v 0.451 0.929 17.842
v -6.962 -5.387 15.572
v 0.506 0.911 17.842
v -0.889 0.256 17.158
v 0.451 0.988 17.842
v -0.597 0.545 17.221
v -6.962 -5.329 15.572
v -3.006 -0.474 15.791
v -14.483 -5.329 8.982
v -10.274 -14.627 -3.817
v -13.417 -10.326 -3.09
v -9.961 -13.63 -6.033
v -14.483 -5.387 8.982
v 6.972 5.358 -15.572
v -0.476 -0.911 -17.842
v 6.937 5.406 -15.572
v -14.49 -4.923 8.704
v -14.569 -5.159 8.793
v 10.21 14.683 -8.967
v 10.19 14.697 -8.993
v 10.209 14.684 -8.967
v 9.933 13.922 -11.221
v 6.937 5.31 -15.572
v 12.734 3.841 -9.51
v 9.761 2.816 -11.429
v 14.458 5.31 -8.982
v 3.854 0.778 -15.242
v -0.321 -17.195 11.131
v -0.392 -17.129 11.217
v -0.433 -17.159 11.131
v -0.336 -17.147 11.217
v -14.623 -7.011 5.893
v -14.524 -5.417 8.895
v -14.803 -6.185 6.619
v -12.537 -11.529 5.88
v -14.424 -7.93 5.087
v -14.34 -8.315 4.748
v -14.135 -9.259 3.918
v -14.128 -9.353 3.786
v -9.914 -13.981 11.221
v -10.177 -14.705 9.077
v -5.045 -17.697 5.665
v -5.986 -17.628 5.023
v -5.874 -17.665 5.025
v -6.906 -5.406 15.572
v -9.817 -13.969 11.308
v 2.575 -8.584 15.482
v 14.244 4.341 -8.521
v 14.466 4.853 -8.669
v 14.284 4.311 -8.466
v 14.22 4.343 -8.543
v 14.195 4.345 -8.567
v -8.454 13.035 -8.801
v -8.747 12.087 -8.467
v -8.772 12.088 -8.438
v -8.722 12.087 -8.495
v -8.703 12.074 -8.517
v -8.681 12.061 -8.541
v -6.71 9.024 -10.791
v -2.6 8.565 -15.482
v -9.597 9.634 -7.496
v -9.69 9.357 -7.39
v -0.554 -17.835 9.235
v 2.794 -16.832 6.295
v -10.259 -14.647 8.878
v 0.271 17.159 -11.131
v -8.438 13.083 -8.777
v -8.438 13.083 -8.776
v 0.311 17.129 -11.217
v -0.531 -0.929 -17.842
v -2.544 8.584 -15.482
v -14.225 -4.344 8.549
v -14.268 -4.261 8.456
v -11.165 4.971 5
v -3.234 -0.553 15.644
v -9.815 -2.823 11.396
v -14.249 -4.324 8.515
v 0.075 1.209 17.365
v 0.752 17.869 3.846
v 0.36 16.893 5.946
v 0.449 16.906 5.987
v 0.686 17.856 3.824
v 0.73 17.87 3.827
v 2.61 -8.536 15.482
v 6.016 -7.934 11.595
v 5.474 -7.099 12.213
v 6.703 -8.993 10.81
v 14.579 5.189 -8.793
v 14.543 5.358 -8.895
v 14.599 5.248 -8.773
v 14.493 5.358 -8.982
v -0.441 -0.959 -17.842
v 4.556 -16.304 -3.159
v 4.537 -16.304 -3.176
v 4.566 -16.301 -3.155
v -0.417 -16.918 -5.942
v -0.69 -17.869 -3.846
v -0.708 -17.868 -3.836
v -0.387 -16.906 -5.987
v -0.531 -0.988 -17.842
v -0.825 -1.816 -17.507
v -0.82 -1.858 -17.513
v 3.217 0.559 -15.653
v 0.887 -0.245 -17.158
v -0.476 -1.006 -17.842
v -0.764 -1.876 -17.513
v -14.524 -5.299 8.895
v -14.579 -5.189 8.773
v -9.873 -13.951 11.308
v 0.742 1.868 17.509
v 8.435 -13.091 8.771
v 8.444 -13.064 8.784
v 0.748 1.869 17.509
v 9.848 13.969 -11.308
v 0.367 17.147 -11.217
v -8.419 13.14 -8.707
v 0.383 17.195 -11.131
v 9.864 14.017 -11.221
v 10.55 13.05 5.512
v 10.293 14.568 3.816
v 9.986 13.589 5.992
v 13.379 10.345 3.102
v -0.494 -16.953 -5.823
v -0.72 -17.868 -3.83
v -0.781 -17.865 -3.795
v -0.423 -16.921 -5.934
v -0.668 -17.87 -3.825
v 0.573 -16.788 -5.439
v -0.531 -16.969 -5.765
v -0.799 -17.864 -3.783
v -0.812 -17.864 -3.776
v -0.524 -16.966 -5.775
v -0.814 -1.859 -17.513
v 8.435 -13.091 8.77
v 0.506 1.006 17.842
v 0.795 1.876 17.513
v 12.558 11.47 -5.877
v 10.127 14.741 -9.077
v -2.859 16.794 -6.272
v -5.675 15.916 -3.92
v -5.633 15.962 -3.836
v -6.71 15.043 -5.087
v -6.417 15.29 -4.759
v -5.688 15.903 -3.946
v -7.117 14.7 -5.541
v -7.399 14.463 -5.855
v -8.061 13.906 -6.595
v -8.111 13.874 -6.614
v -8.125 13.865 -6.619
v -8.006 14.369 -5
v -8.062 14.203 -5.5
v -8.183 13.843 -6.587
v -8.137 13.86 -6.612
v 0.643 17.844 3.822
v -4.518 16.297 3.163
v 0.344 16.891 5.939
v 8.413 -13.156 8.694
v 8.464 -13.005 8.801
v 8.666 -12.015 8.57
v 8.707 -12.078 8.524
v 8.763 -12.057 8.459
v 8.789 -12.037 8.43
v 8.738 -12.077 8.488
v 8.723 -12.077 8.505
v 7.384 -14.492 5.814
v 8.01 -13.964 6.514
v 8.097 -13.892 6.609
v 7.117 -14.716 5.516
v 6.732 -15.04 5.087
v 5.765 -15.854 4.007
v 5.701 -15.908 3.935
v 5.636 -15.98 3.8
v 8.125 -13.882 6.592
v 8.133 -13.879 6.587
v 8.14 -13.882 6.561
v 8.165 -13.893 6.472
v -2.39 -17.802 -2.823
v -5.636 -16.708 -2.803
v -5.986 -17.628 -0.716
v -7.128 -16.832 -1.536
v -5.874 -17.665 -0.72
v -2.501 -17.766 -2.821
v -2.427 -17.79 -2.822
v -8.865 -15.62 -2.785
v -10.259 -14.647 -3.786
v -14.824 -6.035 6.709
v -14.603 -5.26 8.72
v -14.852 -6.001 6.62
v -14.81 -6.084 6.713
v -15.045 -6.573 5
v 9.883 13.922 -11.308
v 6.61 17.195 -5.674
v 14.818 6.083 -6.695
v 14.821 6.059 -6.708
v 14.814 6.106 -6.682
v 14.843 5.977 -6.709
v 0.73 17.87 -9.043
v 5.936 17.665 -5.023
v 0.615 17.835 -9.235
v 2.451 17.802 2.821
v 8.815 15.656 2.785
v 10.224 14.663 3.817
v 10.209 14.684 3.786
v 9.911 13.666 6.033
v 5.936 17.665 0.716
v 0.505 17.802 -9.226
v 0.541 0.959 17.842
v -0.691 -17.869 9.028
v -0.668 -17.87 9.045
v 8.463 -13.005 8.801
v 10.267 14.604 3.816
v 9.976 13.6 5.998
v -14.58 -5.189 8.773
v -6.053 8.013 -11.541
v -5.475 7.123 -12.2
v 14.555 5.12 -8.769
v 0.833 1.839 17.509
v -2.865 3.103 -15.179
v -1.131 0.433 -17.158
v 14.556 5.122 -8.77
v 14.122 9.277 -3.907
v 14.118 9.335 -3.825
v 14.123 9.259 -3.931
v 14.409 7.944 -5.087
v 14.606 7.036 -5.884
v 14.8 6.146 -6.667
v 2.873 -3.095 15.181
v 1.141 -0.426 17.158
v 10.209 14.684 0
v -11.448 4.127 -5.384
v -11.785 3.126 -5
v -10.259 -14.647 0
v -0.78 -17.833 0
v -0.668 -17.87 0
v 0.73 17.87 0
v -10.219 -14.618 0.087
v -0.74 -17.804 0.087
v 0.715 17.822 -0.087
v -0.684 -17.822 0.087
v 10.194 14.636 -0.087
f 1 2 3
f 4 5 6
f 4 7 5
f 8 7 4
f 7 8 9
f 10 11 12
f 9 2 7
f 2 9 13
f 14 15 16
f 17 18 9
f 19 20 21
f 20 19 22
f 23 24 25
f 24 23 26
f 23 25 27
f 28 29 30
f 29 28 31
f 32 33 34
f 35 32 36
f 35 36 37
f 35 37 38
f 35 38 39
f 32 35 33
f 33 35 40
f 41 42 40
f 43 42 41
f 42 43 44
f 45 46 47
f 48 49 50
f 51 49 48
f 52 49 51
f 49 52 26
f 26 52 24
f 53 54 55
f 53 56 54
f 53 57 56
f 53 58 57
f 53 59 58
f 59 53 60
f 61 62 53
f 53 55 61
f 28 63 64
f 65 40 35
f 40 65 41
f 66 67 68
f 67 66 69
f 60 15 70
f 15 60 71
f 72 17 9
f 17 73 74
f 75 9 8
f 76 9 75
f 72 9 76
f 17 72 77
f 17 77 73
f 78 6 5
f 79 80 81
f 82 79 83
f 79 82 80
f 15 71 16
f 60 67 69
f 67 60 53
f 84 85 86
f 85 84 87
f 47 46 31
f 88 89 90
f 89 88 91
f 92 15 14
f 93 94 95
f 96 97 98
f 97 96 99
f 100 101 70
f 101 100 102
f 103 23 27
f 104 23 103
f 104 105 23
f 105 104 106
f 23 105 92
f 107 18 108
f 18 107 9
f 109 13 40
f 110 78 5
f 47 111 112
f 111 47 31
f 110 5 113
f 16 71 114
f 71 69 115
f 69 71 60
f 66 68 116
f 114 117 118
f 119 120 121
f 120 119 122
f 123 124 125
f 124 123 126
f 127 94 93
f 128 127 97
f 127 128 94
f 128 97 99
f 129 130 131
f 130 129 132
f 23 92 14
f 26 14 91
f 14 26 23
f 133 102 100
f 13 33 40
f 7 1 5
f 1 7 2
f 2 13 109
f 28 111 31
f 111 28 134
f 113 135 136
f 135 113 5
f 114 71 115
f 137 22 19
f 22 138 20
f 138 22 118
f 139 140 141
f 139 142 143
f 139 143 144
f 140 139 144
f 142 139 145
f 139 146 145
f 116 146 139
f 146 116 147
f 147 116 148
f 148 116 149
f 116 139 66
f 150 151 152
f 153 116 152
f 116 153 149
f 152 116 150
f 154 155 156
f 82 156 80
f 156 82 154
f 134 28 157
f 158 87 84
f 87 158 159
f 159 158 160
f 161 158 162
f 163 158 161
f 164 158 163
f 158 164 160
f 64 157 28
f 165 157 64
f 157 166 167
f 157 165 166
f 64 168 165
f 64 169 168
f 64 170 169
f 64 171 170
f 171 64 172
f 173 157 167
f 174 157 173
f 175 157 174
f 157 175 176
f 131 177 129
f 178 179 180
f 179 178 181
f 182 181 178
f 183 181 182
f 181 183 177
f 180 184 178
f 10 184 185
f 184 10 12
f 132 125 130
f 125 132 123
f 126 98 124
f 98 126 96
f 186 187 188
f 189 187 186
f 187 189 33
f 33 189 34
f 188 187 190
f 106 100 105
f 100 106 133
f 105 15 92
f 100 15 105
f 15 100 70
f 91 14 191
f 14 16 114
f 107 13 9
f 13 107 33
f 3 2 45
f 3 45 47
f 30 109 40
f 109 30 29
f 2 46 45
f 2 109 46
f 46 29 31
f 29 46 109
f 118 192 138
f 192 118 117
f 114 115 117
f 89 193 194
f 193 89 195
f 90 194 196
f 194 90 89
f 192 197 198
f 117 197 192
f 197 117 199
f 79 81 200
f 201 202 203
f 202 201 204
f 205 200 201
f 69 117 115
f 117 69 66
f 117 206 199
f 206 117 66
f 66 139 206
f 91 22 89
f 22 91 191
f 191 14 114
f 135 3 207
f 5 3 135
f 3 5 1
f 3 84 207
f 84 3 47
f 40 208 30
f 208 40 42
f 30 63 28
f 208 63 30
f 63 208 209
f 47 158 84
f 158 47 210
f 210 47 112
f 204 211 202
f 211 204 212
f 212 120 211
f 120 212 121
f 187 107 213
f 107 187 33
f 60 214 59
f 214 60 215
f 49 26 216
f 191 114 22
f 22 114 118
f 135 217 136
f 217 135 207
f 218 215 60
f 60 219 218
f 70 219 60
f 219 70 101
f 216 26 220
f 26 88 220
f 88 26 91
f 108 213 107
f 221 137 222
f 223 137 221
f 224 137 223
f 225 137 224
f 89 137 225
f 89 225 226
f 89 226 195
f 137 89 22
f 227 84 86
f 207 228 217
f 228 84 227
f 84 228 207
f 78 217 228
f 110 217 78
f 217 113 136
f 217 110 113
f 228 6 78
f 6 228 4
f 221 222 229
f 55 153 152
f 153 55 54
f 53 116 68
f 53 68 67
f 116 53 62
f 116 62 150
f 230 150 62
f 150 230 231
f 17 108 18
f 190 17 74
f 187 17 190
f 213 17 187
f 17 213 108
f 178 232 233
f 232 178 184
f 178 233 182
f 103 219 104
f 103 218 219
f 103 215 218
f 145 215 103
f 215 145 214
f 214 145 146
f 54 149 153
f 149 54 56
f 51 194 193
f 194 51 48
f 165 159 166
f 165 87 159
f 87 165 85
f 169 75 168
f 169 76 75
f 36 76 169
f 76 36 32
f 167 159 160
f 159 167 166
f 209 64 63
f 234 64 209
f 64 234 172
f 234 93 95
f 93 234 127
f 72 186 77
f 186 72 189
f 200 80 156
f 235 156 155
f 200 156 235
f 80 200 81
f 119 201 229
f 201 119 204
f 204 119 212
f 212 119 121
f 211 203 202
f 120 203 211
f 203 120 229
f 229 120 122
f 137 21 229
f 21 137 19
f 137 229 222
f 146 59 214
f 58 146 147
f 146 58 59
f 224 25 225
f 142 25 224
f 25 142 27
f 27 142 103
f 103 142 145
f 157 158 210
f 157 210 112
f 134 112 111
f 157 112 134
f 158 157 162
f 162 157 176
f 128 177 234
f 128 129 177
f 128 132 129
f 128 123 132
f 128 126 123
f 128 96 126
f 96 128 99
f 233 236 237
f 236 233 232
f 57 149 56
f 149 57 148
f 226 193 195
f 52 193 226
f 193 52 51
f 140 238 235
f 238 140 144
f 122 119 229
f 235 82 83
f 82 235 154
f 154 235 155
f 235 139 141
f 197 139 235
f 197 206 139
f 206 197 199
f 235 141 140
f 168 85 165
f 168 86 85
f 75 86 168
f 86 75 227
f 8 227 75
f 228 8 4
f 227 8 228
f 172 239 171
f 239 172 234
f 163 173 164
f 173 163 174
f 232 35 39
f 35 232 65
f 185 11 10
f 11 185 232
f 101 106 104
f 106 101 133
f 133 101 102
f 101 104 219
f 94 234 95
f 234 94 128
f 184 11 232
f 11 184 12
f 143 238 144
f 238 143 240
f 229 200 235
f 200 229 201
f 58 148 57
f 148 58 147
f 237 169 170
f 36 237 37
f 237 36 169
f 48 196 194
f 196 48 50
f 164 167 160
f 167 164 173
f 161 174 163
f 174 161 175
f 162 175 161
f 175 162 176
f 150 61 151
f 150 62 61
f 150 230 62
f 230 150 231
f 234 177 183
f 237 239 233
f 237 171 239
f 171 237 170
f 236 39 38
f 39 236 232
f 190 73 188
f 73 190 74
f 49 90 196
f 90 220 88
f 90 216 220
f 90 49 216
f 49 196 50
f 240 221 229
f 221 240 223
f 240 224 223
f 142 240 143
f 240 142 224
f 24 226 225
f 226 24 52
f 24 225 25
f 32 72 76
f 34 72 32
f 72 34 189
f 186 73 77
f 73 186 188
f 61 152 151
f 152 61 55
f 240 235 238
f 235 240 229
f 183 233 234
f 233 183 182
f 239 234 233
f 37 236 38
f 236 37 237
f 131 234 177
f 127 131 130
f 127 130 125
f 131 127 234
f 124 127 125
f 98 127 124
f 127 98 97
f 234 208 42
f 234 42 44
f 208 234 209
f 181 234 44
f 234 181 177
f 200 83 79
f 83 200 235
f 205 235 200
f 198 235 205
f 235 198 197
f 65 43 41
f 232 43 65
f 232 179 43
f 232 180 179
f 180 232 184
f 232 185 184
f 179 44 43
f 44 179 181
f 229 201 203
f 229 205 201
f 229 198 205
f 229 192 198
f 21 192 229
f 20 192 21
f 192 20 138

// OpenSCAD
// Auto-generated OpenSCAD file

    inner_points = 10*[[-0.9849058201924669, 0.8585262410125142, 1.2071067811863656], [-1.528785757453395, -0.759623373893002, -0.49999999999996925], [-0.7596233738762859, 1.5287857574549684, 0.4999999999997299], [-1.3035033111372138, -0.08936385745054792, -1.207106781186605], [1.3035033111553536, 0.08936385743535108, 1.207106781186605], [0.7596233738944258, -1.528785757470165, -0.4999999999997299], [1.5287857574715347, 0.7596233738778053, 0.49999999999996925], [0.9849058202106068, -0.8585262410277109, -1.2071067811863656], [-1.3035033111373446, -0.08936385745018655, 1.2071067811864902], [-1.5287857574534491, -0.7596233738928524, 0.5000000000000306], [-0.7596233738762316, 1.5287857574548187, -0.50000000000027], [-0.9849058201923361, 0.8585262410121528, -1.2071067811867295], [0.984905820210476, -0.8585262410273495, 1.2071067811867295], [0.7596233738943715, -1.5287857574700154, 0.50000000000027], [1.5287857574715888, 0.7596233738776557, -0.5000000000000306], [1.3035033111554843, 0.0893638574349897, -1.2071067811864902], [-0.4739450492223731, 0.159298745465096, 1.707106781186498], [-1.0178249864833009, -1.4588508694404203, 1.6314155227994063e-13], [0.06993488803873991, 1.7774483603701012, -2.6229591075641936e-13], [-0.4739450492221878, 0.15929874546458486, -1.707106781186597], [0.4739450492403277, -0.1592987454797817, 1.707106781186597], [-0.06993488802060001, -1.777448360385298, 2.6229591075641936e-13], [1.0178249865014406, 1.4588508694252236, -1.6314155227994063e-13], [0.47394504924051306, -0.15929874548029285, -1.707106781186498], [-0.23902080233061446, 1.5083023029927278, 1.353553390593035], [-1.1014982305363656, -1.0577374103756392, -1.3535533905931754], [1.1014982305545054, 1.0577374103604424, 1.3535533905931754], [0.2390208023487544, -1.5083023030079246, -1.353553390593035], [0.27193996863947956, 0.8090748074453095, 1.8535533905931674], [-0.5905374595662716, -1.7569649059230572, -0.8535533905930429], [0.5905374595844115, 1.7569649059078605, 0.8535533905930429], [-0.2719399686213396, -0.8090748074605062, -1.8535533905931674]];

    outer_points = 10*[[-0.8446900511180744, 1.3030414766726957, -0.867637706641361], [-1.5597798480580507, -0.8536041736719377, -0.05157812186332089], [-0.25595636104042685, 0.8536041736719377, -1.5394998597940455], [-0.9710461579804031, -1.3030414766726957, -0.7234402750160054], [0.9710461579804031, 1.3030414766726957, 0.7234402750160054], [0.25595636104042685, -0.8536041736719377, 1.5394998597940455], [1.5597798480580507, 0.8536041736719377, 0.05157812186332089], [0.8446900511180744, -1.3030414766726957, 0.867637706641361], [-1.470432588051366, 0.9891747549732535, -0.15354110359529327], [-1.7666324802585267, 0.0958628773675625, 0.18448184412432744], [-0.04910372883995073, -0.0958628773675625, -1.7755598257816938], [-0.34530362104711143, -0.9891747549732535, -1.437536878062073], [0.34530362104711143, 0.9891747549732535, 1.437536878062073], [0.04910372883995073, 0.0958628773675625, 1.7755598257816938], [1.7666324802585267, -0.0958628773675625, -0.18448184412432744], [1.470432588051366, -0.9891747549732535, 0.15354110359529327], [-0.7291708128859692, 1.6208416413427247, 0.07345652930633434], [-1.4442606098259454, -0.5358040090019087, 0.8895161140843744], [0.692158046325446, 0.5358040090019087, -1.5485621928800661], [-0.022931750614530233, -1.6208416413427247, -0.732502608102026], [0.022931750614530233, 1.6208416413427247, 0.732502608102026], [-0.692158046325446, -0.5358040090019087, 1.5485621928800661], [1.4442606098259454, 0.5358040090019087, -0.8895161140843744], [0.7291708128859692, -1.6208416413427247, -0.07345652930633434], [0.03517302803740674, 1.7099897115417881, -1.113064062349067], [-1.098806673635385, -1.7099897115417881, 0.18103215948739226], [1.098806673635385, 1.7099897115417881, -0.18103215948739226], [-0.03517302803740674, -1.7099897115417881, 1.113064062349067], [0.15069226626951202, 2.027789876211817, -0.17196982640137165], [-0.9832874354032798, -1.392189546871759, 1.122126395435088], [0.9832874354032798, 1.392189546871759, -1.122126395435088], [-0.15069226626951202, -2.027789876211817, 0.17196982640137165]];

    // Convex hull for inner set (I)
    module inner_hull() {
        hull() {
            for (p = inner_points) {
                translate(p) sphere(r=0.1);
            }
        }
    }

    // Convex hull for outer set (O) minus inner hull (O \ I)
    module outer_minus_inner() {
        difference() {
            hull() {
                for (p = outer_points) {
                    translate(p) sphere(r=0.1);
                }
            }
            inner_hull(); // Subtract inner hull
        }
    }

    // Convex hull for outer set (O) minus all translated inner hulls
    module outer_minus_AllTranslationInner() {
        difference() {
            hull() {
                for (p = outer_points) {
                    translate(p) sphere(r=0.1);
                }
            }
            hull() {
                translate([0,0,50]) inner_hull();
                translate([0,0,-50]) inner_hull();
            }; // Subtract translated inner hulls
        }
    }

    // Difference between outer_minus_inner and outer_minus_AllTranslationInner
    module outer_minus_inner_diff() {
        difference() {
            // Outer minus inner
            difference() {
                hull() {
                    for (p = outer_points) {
                        translate(p) sphere(r=0.1);
                    }
                }
                inner_hull();
            }

            // Subtract Outer minus AllTranslationInner
            difference() {
                hull() {
                    for (p = outer_points) {
                        translate(p) sphere(r=0.1);
                    }
                }
                hull() {
                    translate([0,0,50]) inner_hull();
                    translate([0,0,-50]) inner_hull();
                };
            }
        }
    }

    // Rendering all with colors applied
    color([1, 1, 0, 1]) outer_minus_inner_diff(); // Opaque yellow
    
